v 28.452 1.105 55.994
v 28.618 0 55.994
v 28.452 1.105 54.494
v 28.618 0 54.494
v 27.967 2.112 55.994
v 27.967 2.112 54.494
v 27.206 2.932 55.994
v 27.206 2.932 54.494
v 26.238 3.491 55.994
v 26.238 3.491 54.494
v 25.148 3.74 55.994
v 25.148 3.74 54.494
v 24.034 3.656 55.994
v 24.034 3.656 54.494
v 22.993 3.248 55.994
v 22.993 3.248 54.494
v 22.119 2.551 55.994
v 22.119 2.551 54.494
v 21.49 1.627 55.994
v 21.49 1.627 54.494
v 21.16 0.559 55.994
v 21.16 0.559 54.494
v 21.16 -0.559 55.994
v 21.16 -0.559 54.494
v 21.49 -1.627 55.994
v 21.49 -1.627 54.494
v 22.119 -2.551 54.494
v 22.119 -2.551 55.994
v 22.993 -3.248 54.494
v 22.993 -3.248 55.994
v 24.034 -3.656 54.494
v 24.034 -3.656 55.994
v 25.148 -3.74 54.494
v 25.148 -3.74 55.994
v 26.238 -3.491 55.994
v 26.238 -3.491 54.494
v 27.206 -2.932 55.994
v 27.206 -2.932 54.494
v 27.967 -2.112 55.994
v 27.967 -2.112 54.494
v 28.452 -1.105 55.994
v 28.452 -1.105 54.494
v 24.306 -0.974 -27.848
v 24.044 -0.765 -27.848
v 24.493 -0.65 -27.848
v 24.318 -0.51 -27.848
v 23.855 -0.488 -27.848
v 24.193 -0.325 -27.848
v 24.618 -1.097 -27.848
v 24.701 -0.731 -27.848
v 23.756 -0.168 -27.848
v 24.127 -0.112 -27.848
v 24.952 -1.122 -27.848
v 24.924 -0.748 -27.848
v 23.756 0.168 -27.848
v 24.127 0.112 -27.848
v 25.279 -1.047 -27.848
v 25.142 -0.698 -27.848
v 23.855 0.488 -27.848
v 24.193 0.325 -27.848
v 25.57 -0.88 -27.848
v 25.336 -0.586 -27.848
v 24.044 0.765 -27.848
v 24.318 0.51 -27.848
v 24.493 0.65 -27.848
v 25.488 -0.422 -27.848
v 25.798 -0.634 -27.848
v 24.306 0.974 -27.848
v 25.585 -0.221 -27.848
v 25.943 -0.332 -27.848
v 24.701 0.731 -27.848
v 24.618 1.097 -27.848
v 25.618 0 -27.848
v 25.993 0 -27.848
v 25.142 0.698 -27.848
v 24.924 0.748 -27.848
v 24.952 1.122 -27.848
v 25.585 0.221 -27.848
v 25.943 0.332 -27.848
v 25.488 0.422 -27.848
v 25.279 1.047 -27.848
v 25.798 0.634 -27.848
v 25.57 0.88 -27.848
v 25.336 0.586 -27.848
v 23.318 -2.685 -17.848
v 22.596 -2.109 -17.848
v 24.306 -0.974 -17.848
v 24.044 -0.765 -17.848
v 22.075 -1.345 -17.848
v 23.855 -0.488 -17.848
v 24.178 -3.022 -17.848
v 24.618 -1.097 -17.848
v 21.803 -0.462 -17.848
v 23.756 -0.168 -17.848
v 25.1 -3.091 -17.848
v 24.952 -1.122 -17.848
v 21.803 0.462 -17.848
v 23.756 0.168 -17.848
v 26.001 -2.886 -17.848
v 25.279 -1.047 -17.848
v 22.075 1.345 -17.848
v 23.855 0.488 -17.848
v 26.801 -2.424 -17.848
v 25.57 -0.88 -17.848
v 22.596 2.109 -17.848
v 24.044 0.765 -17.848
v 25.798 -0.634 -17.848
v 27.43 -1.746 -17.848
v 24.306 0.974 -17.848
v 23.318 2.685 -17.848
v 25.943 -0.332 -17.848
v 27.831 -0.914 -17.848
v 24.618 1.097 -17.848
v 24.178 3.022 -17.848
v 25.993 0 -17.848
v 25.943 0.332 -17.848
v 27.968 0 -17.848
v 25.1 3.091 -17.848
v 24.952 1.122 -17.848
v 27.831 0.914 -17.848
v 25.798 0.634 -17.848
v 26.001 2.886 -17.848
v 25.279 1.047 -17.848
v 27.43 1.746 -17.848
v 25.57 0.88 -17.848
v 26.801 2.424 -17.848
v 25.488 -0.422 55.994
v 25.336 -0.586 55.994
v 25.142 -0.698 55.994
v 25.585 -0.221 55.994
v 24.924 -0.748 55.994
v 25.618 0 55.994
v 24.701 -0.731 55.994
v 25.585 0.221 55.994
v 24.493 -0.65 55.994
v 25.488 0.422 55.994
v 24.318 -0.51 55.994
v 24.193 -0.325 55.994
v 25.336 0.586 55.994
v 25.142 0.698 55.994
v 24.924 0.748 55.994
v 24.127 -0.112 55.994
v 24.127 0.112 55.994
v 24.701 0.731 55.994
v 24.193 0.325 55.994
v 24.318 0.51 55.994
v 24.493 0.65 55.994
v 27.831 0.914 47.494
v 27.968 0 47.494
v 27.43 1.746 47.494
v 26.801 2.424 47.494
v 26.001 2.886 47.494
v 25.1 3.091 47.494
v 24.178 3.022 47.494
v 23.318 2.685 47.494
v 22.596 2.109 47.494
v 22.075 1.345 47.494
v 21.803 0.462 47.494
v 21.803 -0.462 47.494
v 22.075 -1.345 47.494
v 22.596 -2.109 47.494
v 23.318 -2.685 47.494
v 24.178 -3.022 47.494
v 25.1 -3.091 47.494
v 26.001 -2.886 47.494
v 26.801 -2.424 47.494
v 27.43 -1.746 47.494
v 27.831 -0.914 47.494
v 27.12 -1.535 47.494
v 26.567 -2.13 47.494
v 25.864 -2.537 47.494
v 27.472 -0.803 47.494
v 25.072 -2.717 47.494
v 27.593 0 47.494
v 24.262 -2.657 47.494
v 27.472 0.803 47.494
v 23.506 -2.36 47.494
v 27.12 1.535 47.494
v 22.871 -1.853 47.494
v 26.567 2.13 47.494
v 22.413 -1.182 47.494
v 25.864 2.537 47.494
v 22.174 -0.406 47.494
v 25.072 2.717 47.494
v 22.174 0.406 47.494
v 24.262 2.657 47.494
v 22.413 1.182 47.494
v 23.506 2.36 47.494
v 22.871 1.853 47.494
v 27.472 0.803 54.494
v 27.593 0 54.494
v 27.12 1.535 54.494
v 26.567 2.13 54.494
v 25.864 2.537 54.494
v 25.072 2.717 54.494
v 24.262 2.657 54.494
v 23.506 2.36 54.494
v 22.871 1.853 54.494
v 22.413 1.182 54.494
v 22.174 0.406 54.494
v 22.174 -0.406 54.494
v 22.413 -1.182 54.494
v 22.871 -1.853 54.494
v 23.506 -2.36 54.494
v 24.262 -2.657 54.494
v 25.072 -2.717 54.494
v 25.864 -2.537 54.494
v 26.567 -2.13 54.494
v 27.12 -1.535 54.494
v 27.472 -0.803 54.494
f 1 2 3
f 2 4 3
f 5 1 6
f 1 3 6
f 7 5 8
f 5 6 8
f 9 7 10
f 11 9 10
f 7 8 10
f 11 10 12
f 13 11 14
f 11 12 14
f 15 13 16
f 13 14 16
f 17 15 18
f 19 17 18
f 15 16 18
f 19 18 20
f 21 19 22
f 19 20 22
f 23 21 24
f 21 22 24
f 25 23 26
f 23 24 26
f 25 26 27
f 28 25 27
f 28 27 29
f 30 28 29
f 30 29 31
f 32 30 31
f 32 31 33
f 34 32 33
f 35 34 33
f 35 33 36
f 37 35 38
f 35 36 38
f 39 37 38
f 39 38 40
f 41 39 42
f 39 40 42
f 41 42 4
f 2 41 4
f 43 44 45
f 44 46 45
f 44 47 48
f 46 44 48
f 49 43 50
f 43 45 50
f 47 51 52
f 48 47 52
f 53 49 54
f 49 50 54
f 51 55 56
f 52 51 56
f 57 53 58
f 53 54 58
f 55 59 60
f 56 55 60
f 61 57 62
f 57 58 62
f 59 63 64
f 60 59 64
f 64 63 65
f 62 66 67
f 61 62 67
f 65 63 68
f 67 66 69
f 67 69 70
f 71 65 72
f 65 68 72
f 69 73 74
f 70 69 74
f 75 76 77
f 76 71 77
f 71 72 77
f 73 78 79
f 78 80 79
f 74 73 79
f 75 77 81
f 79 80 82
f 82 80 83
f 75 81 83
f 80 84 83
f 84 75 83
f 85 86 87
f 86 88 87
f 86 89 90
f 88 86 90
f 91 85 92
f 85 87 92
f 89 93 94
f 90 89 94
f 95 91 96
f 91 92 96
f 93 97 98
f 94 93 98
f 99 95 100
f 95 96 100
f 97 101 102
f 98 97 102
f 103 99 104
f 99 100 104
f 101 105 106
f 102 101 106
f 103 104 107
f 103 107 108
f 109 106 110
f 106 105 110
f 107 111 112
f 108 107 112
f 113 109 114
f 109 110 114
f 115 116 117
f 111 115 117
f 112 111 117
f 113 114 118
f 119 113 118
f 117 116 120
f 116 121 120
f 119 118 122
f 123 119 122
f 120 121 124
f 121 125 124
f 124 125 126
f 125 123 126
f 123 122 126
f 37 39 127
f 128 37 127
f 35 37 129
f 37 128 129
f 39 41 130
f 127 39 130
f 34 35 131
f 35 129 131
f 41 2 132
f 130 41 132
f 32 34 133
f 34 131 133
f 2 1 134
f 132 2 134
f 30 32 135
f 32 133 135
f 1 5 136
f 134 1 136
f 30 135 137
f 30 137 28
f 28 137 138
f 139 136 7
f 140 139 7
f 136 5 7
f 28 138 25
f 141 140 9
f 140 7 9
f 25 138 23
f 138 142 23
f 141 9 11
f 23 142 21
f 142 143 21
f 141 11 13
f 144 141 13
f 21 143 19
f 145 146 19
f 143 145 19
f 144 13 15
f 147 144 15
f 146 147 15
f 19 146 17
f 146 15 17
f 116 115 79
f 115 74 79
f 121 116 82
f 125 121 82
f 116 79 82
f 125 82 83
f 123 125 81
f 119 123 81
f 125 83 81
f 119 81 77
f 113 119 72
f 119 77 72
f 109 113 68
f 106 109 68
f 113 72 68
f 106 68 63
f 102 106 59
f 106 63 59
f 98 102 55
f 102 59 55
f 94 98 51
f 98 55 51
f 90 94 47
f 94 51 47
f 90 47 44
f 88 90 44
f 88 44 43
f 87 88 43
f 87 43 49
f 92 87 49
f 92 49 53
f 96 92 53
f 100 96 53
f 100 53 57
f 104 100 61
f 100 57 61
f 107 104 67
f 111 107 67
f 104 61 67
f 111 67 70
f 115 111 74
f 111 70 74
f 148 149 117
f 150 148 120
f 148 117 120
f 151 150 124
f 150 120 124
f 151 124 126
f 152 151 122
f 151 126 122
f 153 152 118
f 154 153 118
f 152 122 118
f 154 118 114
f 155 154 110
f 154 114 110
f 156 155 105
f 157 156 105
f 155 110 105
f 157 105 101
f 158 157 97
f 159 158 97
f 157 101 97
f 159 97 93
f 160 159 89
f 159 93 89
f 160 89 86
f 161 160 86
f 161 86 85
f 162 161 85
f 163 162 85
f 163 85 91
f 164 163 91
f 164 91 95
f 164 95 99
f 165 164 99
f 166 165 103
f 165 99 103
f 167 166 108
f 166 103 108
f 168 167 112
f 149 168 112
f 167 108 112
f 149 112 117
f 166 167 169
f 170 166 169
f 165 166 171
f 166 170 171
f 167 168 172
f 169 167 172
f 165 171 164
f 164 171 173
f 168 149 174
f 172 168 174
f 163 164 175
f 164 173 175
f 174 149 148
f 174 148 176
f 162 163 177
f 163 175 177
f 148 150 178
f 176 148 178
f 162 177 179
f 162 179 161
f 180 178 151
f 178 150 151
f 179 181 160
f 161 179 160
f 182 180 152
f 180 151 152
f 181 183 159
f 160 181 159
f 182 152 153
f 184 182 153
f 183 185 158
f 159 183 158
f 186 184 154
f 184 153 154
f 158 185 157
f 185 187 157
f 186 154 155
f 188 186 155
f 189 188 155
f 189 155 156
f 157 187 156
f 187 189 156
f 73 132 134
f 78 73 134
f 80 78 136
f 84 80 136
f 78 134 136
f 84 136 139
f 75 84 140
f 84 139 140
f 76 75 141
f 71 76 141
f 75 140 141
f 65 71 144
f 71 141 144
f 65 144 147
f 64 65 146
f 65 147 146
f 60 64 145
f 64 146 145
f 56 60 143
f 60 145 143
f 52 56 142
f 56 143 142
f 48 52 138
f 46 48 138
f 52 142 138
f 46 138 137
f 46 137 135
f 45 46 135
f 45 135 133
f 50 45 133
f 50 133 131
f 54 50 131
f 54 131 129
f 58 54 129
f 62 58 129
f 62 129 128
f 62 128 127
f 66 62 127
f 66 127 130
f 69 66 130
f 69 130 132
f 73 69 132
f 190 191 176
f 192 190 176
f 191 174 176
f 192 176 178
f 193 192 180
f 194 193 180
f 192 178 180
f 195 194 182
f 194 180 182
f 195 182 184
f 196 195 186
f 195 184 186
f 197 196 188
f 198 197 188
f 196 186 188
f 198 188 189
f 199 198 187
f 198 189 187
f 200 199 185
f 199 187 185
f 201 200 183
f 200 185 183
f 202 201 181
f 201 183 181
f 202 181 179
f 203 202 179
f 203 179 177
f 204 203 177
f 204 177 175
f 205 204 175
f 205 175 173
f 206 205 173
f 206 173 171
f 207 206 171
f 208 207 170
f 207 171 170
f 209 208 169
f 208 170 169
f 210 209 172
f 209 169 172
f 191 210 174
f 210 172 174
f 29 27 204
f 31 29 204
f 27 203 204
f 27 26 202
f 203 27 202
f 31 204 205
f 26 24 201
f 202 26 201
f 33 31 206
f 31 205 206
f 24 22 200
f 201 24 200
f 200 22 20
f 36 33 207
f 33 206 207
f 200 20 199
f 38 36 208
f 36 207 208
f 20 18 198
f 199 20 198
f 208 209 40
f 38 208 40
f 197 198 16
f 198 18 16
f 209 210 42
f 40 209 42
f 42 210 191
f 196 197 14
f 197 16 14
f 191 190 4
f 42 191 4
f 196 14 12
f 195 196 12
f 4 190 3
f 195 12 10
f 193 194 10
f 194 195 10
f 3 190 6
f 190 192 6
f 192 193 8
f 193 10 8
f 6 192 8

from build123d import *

# Parameters (mm, degrees)
SKETCH3_R          = 0.75
CUT_EXTRUDE6_DEPTH = 84.84194368


with BuildPart() as part:
    # Sketch2 → Revolve4 (revolve)
    with BuildSketch(Plane(origin=(0, 0, 0), x_dir=(1, 0, 0), z_dir=(0, 1, 0))):
        Polygon((24.868249983, 17.00561082), (24.868249983, -55.99438918), (28.618249983, -55.99438918), (28.618249983, -54.49438918), (27.593249983, -54.49438918), (27.593249983, -47.49438918), (27.968249983, -47.49438918), (27.968249983, 17.8475545), (25.993249983, 17.8475545), (25.993249983, 27.8475545), (24.868249983, 27.8475545), align=None)
    revolve(axis=Axis((24.868249983, 0, -17.00561082), (0, 0, 1)))

    # Sketch3 → Cut-Extrude6 (cut, through all)
    with BuildSketch(Plane.XY.offset(55.99438918)):
        with Locations((24.868249983, 0)):
            Circle(SKETCH3_R)
    extrude(amount=-CUT_EXTRUDE6_DEPTH, mode=Mode.SUBTRACT)


solid = part.part
